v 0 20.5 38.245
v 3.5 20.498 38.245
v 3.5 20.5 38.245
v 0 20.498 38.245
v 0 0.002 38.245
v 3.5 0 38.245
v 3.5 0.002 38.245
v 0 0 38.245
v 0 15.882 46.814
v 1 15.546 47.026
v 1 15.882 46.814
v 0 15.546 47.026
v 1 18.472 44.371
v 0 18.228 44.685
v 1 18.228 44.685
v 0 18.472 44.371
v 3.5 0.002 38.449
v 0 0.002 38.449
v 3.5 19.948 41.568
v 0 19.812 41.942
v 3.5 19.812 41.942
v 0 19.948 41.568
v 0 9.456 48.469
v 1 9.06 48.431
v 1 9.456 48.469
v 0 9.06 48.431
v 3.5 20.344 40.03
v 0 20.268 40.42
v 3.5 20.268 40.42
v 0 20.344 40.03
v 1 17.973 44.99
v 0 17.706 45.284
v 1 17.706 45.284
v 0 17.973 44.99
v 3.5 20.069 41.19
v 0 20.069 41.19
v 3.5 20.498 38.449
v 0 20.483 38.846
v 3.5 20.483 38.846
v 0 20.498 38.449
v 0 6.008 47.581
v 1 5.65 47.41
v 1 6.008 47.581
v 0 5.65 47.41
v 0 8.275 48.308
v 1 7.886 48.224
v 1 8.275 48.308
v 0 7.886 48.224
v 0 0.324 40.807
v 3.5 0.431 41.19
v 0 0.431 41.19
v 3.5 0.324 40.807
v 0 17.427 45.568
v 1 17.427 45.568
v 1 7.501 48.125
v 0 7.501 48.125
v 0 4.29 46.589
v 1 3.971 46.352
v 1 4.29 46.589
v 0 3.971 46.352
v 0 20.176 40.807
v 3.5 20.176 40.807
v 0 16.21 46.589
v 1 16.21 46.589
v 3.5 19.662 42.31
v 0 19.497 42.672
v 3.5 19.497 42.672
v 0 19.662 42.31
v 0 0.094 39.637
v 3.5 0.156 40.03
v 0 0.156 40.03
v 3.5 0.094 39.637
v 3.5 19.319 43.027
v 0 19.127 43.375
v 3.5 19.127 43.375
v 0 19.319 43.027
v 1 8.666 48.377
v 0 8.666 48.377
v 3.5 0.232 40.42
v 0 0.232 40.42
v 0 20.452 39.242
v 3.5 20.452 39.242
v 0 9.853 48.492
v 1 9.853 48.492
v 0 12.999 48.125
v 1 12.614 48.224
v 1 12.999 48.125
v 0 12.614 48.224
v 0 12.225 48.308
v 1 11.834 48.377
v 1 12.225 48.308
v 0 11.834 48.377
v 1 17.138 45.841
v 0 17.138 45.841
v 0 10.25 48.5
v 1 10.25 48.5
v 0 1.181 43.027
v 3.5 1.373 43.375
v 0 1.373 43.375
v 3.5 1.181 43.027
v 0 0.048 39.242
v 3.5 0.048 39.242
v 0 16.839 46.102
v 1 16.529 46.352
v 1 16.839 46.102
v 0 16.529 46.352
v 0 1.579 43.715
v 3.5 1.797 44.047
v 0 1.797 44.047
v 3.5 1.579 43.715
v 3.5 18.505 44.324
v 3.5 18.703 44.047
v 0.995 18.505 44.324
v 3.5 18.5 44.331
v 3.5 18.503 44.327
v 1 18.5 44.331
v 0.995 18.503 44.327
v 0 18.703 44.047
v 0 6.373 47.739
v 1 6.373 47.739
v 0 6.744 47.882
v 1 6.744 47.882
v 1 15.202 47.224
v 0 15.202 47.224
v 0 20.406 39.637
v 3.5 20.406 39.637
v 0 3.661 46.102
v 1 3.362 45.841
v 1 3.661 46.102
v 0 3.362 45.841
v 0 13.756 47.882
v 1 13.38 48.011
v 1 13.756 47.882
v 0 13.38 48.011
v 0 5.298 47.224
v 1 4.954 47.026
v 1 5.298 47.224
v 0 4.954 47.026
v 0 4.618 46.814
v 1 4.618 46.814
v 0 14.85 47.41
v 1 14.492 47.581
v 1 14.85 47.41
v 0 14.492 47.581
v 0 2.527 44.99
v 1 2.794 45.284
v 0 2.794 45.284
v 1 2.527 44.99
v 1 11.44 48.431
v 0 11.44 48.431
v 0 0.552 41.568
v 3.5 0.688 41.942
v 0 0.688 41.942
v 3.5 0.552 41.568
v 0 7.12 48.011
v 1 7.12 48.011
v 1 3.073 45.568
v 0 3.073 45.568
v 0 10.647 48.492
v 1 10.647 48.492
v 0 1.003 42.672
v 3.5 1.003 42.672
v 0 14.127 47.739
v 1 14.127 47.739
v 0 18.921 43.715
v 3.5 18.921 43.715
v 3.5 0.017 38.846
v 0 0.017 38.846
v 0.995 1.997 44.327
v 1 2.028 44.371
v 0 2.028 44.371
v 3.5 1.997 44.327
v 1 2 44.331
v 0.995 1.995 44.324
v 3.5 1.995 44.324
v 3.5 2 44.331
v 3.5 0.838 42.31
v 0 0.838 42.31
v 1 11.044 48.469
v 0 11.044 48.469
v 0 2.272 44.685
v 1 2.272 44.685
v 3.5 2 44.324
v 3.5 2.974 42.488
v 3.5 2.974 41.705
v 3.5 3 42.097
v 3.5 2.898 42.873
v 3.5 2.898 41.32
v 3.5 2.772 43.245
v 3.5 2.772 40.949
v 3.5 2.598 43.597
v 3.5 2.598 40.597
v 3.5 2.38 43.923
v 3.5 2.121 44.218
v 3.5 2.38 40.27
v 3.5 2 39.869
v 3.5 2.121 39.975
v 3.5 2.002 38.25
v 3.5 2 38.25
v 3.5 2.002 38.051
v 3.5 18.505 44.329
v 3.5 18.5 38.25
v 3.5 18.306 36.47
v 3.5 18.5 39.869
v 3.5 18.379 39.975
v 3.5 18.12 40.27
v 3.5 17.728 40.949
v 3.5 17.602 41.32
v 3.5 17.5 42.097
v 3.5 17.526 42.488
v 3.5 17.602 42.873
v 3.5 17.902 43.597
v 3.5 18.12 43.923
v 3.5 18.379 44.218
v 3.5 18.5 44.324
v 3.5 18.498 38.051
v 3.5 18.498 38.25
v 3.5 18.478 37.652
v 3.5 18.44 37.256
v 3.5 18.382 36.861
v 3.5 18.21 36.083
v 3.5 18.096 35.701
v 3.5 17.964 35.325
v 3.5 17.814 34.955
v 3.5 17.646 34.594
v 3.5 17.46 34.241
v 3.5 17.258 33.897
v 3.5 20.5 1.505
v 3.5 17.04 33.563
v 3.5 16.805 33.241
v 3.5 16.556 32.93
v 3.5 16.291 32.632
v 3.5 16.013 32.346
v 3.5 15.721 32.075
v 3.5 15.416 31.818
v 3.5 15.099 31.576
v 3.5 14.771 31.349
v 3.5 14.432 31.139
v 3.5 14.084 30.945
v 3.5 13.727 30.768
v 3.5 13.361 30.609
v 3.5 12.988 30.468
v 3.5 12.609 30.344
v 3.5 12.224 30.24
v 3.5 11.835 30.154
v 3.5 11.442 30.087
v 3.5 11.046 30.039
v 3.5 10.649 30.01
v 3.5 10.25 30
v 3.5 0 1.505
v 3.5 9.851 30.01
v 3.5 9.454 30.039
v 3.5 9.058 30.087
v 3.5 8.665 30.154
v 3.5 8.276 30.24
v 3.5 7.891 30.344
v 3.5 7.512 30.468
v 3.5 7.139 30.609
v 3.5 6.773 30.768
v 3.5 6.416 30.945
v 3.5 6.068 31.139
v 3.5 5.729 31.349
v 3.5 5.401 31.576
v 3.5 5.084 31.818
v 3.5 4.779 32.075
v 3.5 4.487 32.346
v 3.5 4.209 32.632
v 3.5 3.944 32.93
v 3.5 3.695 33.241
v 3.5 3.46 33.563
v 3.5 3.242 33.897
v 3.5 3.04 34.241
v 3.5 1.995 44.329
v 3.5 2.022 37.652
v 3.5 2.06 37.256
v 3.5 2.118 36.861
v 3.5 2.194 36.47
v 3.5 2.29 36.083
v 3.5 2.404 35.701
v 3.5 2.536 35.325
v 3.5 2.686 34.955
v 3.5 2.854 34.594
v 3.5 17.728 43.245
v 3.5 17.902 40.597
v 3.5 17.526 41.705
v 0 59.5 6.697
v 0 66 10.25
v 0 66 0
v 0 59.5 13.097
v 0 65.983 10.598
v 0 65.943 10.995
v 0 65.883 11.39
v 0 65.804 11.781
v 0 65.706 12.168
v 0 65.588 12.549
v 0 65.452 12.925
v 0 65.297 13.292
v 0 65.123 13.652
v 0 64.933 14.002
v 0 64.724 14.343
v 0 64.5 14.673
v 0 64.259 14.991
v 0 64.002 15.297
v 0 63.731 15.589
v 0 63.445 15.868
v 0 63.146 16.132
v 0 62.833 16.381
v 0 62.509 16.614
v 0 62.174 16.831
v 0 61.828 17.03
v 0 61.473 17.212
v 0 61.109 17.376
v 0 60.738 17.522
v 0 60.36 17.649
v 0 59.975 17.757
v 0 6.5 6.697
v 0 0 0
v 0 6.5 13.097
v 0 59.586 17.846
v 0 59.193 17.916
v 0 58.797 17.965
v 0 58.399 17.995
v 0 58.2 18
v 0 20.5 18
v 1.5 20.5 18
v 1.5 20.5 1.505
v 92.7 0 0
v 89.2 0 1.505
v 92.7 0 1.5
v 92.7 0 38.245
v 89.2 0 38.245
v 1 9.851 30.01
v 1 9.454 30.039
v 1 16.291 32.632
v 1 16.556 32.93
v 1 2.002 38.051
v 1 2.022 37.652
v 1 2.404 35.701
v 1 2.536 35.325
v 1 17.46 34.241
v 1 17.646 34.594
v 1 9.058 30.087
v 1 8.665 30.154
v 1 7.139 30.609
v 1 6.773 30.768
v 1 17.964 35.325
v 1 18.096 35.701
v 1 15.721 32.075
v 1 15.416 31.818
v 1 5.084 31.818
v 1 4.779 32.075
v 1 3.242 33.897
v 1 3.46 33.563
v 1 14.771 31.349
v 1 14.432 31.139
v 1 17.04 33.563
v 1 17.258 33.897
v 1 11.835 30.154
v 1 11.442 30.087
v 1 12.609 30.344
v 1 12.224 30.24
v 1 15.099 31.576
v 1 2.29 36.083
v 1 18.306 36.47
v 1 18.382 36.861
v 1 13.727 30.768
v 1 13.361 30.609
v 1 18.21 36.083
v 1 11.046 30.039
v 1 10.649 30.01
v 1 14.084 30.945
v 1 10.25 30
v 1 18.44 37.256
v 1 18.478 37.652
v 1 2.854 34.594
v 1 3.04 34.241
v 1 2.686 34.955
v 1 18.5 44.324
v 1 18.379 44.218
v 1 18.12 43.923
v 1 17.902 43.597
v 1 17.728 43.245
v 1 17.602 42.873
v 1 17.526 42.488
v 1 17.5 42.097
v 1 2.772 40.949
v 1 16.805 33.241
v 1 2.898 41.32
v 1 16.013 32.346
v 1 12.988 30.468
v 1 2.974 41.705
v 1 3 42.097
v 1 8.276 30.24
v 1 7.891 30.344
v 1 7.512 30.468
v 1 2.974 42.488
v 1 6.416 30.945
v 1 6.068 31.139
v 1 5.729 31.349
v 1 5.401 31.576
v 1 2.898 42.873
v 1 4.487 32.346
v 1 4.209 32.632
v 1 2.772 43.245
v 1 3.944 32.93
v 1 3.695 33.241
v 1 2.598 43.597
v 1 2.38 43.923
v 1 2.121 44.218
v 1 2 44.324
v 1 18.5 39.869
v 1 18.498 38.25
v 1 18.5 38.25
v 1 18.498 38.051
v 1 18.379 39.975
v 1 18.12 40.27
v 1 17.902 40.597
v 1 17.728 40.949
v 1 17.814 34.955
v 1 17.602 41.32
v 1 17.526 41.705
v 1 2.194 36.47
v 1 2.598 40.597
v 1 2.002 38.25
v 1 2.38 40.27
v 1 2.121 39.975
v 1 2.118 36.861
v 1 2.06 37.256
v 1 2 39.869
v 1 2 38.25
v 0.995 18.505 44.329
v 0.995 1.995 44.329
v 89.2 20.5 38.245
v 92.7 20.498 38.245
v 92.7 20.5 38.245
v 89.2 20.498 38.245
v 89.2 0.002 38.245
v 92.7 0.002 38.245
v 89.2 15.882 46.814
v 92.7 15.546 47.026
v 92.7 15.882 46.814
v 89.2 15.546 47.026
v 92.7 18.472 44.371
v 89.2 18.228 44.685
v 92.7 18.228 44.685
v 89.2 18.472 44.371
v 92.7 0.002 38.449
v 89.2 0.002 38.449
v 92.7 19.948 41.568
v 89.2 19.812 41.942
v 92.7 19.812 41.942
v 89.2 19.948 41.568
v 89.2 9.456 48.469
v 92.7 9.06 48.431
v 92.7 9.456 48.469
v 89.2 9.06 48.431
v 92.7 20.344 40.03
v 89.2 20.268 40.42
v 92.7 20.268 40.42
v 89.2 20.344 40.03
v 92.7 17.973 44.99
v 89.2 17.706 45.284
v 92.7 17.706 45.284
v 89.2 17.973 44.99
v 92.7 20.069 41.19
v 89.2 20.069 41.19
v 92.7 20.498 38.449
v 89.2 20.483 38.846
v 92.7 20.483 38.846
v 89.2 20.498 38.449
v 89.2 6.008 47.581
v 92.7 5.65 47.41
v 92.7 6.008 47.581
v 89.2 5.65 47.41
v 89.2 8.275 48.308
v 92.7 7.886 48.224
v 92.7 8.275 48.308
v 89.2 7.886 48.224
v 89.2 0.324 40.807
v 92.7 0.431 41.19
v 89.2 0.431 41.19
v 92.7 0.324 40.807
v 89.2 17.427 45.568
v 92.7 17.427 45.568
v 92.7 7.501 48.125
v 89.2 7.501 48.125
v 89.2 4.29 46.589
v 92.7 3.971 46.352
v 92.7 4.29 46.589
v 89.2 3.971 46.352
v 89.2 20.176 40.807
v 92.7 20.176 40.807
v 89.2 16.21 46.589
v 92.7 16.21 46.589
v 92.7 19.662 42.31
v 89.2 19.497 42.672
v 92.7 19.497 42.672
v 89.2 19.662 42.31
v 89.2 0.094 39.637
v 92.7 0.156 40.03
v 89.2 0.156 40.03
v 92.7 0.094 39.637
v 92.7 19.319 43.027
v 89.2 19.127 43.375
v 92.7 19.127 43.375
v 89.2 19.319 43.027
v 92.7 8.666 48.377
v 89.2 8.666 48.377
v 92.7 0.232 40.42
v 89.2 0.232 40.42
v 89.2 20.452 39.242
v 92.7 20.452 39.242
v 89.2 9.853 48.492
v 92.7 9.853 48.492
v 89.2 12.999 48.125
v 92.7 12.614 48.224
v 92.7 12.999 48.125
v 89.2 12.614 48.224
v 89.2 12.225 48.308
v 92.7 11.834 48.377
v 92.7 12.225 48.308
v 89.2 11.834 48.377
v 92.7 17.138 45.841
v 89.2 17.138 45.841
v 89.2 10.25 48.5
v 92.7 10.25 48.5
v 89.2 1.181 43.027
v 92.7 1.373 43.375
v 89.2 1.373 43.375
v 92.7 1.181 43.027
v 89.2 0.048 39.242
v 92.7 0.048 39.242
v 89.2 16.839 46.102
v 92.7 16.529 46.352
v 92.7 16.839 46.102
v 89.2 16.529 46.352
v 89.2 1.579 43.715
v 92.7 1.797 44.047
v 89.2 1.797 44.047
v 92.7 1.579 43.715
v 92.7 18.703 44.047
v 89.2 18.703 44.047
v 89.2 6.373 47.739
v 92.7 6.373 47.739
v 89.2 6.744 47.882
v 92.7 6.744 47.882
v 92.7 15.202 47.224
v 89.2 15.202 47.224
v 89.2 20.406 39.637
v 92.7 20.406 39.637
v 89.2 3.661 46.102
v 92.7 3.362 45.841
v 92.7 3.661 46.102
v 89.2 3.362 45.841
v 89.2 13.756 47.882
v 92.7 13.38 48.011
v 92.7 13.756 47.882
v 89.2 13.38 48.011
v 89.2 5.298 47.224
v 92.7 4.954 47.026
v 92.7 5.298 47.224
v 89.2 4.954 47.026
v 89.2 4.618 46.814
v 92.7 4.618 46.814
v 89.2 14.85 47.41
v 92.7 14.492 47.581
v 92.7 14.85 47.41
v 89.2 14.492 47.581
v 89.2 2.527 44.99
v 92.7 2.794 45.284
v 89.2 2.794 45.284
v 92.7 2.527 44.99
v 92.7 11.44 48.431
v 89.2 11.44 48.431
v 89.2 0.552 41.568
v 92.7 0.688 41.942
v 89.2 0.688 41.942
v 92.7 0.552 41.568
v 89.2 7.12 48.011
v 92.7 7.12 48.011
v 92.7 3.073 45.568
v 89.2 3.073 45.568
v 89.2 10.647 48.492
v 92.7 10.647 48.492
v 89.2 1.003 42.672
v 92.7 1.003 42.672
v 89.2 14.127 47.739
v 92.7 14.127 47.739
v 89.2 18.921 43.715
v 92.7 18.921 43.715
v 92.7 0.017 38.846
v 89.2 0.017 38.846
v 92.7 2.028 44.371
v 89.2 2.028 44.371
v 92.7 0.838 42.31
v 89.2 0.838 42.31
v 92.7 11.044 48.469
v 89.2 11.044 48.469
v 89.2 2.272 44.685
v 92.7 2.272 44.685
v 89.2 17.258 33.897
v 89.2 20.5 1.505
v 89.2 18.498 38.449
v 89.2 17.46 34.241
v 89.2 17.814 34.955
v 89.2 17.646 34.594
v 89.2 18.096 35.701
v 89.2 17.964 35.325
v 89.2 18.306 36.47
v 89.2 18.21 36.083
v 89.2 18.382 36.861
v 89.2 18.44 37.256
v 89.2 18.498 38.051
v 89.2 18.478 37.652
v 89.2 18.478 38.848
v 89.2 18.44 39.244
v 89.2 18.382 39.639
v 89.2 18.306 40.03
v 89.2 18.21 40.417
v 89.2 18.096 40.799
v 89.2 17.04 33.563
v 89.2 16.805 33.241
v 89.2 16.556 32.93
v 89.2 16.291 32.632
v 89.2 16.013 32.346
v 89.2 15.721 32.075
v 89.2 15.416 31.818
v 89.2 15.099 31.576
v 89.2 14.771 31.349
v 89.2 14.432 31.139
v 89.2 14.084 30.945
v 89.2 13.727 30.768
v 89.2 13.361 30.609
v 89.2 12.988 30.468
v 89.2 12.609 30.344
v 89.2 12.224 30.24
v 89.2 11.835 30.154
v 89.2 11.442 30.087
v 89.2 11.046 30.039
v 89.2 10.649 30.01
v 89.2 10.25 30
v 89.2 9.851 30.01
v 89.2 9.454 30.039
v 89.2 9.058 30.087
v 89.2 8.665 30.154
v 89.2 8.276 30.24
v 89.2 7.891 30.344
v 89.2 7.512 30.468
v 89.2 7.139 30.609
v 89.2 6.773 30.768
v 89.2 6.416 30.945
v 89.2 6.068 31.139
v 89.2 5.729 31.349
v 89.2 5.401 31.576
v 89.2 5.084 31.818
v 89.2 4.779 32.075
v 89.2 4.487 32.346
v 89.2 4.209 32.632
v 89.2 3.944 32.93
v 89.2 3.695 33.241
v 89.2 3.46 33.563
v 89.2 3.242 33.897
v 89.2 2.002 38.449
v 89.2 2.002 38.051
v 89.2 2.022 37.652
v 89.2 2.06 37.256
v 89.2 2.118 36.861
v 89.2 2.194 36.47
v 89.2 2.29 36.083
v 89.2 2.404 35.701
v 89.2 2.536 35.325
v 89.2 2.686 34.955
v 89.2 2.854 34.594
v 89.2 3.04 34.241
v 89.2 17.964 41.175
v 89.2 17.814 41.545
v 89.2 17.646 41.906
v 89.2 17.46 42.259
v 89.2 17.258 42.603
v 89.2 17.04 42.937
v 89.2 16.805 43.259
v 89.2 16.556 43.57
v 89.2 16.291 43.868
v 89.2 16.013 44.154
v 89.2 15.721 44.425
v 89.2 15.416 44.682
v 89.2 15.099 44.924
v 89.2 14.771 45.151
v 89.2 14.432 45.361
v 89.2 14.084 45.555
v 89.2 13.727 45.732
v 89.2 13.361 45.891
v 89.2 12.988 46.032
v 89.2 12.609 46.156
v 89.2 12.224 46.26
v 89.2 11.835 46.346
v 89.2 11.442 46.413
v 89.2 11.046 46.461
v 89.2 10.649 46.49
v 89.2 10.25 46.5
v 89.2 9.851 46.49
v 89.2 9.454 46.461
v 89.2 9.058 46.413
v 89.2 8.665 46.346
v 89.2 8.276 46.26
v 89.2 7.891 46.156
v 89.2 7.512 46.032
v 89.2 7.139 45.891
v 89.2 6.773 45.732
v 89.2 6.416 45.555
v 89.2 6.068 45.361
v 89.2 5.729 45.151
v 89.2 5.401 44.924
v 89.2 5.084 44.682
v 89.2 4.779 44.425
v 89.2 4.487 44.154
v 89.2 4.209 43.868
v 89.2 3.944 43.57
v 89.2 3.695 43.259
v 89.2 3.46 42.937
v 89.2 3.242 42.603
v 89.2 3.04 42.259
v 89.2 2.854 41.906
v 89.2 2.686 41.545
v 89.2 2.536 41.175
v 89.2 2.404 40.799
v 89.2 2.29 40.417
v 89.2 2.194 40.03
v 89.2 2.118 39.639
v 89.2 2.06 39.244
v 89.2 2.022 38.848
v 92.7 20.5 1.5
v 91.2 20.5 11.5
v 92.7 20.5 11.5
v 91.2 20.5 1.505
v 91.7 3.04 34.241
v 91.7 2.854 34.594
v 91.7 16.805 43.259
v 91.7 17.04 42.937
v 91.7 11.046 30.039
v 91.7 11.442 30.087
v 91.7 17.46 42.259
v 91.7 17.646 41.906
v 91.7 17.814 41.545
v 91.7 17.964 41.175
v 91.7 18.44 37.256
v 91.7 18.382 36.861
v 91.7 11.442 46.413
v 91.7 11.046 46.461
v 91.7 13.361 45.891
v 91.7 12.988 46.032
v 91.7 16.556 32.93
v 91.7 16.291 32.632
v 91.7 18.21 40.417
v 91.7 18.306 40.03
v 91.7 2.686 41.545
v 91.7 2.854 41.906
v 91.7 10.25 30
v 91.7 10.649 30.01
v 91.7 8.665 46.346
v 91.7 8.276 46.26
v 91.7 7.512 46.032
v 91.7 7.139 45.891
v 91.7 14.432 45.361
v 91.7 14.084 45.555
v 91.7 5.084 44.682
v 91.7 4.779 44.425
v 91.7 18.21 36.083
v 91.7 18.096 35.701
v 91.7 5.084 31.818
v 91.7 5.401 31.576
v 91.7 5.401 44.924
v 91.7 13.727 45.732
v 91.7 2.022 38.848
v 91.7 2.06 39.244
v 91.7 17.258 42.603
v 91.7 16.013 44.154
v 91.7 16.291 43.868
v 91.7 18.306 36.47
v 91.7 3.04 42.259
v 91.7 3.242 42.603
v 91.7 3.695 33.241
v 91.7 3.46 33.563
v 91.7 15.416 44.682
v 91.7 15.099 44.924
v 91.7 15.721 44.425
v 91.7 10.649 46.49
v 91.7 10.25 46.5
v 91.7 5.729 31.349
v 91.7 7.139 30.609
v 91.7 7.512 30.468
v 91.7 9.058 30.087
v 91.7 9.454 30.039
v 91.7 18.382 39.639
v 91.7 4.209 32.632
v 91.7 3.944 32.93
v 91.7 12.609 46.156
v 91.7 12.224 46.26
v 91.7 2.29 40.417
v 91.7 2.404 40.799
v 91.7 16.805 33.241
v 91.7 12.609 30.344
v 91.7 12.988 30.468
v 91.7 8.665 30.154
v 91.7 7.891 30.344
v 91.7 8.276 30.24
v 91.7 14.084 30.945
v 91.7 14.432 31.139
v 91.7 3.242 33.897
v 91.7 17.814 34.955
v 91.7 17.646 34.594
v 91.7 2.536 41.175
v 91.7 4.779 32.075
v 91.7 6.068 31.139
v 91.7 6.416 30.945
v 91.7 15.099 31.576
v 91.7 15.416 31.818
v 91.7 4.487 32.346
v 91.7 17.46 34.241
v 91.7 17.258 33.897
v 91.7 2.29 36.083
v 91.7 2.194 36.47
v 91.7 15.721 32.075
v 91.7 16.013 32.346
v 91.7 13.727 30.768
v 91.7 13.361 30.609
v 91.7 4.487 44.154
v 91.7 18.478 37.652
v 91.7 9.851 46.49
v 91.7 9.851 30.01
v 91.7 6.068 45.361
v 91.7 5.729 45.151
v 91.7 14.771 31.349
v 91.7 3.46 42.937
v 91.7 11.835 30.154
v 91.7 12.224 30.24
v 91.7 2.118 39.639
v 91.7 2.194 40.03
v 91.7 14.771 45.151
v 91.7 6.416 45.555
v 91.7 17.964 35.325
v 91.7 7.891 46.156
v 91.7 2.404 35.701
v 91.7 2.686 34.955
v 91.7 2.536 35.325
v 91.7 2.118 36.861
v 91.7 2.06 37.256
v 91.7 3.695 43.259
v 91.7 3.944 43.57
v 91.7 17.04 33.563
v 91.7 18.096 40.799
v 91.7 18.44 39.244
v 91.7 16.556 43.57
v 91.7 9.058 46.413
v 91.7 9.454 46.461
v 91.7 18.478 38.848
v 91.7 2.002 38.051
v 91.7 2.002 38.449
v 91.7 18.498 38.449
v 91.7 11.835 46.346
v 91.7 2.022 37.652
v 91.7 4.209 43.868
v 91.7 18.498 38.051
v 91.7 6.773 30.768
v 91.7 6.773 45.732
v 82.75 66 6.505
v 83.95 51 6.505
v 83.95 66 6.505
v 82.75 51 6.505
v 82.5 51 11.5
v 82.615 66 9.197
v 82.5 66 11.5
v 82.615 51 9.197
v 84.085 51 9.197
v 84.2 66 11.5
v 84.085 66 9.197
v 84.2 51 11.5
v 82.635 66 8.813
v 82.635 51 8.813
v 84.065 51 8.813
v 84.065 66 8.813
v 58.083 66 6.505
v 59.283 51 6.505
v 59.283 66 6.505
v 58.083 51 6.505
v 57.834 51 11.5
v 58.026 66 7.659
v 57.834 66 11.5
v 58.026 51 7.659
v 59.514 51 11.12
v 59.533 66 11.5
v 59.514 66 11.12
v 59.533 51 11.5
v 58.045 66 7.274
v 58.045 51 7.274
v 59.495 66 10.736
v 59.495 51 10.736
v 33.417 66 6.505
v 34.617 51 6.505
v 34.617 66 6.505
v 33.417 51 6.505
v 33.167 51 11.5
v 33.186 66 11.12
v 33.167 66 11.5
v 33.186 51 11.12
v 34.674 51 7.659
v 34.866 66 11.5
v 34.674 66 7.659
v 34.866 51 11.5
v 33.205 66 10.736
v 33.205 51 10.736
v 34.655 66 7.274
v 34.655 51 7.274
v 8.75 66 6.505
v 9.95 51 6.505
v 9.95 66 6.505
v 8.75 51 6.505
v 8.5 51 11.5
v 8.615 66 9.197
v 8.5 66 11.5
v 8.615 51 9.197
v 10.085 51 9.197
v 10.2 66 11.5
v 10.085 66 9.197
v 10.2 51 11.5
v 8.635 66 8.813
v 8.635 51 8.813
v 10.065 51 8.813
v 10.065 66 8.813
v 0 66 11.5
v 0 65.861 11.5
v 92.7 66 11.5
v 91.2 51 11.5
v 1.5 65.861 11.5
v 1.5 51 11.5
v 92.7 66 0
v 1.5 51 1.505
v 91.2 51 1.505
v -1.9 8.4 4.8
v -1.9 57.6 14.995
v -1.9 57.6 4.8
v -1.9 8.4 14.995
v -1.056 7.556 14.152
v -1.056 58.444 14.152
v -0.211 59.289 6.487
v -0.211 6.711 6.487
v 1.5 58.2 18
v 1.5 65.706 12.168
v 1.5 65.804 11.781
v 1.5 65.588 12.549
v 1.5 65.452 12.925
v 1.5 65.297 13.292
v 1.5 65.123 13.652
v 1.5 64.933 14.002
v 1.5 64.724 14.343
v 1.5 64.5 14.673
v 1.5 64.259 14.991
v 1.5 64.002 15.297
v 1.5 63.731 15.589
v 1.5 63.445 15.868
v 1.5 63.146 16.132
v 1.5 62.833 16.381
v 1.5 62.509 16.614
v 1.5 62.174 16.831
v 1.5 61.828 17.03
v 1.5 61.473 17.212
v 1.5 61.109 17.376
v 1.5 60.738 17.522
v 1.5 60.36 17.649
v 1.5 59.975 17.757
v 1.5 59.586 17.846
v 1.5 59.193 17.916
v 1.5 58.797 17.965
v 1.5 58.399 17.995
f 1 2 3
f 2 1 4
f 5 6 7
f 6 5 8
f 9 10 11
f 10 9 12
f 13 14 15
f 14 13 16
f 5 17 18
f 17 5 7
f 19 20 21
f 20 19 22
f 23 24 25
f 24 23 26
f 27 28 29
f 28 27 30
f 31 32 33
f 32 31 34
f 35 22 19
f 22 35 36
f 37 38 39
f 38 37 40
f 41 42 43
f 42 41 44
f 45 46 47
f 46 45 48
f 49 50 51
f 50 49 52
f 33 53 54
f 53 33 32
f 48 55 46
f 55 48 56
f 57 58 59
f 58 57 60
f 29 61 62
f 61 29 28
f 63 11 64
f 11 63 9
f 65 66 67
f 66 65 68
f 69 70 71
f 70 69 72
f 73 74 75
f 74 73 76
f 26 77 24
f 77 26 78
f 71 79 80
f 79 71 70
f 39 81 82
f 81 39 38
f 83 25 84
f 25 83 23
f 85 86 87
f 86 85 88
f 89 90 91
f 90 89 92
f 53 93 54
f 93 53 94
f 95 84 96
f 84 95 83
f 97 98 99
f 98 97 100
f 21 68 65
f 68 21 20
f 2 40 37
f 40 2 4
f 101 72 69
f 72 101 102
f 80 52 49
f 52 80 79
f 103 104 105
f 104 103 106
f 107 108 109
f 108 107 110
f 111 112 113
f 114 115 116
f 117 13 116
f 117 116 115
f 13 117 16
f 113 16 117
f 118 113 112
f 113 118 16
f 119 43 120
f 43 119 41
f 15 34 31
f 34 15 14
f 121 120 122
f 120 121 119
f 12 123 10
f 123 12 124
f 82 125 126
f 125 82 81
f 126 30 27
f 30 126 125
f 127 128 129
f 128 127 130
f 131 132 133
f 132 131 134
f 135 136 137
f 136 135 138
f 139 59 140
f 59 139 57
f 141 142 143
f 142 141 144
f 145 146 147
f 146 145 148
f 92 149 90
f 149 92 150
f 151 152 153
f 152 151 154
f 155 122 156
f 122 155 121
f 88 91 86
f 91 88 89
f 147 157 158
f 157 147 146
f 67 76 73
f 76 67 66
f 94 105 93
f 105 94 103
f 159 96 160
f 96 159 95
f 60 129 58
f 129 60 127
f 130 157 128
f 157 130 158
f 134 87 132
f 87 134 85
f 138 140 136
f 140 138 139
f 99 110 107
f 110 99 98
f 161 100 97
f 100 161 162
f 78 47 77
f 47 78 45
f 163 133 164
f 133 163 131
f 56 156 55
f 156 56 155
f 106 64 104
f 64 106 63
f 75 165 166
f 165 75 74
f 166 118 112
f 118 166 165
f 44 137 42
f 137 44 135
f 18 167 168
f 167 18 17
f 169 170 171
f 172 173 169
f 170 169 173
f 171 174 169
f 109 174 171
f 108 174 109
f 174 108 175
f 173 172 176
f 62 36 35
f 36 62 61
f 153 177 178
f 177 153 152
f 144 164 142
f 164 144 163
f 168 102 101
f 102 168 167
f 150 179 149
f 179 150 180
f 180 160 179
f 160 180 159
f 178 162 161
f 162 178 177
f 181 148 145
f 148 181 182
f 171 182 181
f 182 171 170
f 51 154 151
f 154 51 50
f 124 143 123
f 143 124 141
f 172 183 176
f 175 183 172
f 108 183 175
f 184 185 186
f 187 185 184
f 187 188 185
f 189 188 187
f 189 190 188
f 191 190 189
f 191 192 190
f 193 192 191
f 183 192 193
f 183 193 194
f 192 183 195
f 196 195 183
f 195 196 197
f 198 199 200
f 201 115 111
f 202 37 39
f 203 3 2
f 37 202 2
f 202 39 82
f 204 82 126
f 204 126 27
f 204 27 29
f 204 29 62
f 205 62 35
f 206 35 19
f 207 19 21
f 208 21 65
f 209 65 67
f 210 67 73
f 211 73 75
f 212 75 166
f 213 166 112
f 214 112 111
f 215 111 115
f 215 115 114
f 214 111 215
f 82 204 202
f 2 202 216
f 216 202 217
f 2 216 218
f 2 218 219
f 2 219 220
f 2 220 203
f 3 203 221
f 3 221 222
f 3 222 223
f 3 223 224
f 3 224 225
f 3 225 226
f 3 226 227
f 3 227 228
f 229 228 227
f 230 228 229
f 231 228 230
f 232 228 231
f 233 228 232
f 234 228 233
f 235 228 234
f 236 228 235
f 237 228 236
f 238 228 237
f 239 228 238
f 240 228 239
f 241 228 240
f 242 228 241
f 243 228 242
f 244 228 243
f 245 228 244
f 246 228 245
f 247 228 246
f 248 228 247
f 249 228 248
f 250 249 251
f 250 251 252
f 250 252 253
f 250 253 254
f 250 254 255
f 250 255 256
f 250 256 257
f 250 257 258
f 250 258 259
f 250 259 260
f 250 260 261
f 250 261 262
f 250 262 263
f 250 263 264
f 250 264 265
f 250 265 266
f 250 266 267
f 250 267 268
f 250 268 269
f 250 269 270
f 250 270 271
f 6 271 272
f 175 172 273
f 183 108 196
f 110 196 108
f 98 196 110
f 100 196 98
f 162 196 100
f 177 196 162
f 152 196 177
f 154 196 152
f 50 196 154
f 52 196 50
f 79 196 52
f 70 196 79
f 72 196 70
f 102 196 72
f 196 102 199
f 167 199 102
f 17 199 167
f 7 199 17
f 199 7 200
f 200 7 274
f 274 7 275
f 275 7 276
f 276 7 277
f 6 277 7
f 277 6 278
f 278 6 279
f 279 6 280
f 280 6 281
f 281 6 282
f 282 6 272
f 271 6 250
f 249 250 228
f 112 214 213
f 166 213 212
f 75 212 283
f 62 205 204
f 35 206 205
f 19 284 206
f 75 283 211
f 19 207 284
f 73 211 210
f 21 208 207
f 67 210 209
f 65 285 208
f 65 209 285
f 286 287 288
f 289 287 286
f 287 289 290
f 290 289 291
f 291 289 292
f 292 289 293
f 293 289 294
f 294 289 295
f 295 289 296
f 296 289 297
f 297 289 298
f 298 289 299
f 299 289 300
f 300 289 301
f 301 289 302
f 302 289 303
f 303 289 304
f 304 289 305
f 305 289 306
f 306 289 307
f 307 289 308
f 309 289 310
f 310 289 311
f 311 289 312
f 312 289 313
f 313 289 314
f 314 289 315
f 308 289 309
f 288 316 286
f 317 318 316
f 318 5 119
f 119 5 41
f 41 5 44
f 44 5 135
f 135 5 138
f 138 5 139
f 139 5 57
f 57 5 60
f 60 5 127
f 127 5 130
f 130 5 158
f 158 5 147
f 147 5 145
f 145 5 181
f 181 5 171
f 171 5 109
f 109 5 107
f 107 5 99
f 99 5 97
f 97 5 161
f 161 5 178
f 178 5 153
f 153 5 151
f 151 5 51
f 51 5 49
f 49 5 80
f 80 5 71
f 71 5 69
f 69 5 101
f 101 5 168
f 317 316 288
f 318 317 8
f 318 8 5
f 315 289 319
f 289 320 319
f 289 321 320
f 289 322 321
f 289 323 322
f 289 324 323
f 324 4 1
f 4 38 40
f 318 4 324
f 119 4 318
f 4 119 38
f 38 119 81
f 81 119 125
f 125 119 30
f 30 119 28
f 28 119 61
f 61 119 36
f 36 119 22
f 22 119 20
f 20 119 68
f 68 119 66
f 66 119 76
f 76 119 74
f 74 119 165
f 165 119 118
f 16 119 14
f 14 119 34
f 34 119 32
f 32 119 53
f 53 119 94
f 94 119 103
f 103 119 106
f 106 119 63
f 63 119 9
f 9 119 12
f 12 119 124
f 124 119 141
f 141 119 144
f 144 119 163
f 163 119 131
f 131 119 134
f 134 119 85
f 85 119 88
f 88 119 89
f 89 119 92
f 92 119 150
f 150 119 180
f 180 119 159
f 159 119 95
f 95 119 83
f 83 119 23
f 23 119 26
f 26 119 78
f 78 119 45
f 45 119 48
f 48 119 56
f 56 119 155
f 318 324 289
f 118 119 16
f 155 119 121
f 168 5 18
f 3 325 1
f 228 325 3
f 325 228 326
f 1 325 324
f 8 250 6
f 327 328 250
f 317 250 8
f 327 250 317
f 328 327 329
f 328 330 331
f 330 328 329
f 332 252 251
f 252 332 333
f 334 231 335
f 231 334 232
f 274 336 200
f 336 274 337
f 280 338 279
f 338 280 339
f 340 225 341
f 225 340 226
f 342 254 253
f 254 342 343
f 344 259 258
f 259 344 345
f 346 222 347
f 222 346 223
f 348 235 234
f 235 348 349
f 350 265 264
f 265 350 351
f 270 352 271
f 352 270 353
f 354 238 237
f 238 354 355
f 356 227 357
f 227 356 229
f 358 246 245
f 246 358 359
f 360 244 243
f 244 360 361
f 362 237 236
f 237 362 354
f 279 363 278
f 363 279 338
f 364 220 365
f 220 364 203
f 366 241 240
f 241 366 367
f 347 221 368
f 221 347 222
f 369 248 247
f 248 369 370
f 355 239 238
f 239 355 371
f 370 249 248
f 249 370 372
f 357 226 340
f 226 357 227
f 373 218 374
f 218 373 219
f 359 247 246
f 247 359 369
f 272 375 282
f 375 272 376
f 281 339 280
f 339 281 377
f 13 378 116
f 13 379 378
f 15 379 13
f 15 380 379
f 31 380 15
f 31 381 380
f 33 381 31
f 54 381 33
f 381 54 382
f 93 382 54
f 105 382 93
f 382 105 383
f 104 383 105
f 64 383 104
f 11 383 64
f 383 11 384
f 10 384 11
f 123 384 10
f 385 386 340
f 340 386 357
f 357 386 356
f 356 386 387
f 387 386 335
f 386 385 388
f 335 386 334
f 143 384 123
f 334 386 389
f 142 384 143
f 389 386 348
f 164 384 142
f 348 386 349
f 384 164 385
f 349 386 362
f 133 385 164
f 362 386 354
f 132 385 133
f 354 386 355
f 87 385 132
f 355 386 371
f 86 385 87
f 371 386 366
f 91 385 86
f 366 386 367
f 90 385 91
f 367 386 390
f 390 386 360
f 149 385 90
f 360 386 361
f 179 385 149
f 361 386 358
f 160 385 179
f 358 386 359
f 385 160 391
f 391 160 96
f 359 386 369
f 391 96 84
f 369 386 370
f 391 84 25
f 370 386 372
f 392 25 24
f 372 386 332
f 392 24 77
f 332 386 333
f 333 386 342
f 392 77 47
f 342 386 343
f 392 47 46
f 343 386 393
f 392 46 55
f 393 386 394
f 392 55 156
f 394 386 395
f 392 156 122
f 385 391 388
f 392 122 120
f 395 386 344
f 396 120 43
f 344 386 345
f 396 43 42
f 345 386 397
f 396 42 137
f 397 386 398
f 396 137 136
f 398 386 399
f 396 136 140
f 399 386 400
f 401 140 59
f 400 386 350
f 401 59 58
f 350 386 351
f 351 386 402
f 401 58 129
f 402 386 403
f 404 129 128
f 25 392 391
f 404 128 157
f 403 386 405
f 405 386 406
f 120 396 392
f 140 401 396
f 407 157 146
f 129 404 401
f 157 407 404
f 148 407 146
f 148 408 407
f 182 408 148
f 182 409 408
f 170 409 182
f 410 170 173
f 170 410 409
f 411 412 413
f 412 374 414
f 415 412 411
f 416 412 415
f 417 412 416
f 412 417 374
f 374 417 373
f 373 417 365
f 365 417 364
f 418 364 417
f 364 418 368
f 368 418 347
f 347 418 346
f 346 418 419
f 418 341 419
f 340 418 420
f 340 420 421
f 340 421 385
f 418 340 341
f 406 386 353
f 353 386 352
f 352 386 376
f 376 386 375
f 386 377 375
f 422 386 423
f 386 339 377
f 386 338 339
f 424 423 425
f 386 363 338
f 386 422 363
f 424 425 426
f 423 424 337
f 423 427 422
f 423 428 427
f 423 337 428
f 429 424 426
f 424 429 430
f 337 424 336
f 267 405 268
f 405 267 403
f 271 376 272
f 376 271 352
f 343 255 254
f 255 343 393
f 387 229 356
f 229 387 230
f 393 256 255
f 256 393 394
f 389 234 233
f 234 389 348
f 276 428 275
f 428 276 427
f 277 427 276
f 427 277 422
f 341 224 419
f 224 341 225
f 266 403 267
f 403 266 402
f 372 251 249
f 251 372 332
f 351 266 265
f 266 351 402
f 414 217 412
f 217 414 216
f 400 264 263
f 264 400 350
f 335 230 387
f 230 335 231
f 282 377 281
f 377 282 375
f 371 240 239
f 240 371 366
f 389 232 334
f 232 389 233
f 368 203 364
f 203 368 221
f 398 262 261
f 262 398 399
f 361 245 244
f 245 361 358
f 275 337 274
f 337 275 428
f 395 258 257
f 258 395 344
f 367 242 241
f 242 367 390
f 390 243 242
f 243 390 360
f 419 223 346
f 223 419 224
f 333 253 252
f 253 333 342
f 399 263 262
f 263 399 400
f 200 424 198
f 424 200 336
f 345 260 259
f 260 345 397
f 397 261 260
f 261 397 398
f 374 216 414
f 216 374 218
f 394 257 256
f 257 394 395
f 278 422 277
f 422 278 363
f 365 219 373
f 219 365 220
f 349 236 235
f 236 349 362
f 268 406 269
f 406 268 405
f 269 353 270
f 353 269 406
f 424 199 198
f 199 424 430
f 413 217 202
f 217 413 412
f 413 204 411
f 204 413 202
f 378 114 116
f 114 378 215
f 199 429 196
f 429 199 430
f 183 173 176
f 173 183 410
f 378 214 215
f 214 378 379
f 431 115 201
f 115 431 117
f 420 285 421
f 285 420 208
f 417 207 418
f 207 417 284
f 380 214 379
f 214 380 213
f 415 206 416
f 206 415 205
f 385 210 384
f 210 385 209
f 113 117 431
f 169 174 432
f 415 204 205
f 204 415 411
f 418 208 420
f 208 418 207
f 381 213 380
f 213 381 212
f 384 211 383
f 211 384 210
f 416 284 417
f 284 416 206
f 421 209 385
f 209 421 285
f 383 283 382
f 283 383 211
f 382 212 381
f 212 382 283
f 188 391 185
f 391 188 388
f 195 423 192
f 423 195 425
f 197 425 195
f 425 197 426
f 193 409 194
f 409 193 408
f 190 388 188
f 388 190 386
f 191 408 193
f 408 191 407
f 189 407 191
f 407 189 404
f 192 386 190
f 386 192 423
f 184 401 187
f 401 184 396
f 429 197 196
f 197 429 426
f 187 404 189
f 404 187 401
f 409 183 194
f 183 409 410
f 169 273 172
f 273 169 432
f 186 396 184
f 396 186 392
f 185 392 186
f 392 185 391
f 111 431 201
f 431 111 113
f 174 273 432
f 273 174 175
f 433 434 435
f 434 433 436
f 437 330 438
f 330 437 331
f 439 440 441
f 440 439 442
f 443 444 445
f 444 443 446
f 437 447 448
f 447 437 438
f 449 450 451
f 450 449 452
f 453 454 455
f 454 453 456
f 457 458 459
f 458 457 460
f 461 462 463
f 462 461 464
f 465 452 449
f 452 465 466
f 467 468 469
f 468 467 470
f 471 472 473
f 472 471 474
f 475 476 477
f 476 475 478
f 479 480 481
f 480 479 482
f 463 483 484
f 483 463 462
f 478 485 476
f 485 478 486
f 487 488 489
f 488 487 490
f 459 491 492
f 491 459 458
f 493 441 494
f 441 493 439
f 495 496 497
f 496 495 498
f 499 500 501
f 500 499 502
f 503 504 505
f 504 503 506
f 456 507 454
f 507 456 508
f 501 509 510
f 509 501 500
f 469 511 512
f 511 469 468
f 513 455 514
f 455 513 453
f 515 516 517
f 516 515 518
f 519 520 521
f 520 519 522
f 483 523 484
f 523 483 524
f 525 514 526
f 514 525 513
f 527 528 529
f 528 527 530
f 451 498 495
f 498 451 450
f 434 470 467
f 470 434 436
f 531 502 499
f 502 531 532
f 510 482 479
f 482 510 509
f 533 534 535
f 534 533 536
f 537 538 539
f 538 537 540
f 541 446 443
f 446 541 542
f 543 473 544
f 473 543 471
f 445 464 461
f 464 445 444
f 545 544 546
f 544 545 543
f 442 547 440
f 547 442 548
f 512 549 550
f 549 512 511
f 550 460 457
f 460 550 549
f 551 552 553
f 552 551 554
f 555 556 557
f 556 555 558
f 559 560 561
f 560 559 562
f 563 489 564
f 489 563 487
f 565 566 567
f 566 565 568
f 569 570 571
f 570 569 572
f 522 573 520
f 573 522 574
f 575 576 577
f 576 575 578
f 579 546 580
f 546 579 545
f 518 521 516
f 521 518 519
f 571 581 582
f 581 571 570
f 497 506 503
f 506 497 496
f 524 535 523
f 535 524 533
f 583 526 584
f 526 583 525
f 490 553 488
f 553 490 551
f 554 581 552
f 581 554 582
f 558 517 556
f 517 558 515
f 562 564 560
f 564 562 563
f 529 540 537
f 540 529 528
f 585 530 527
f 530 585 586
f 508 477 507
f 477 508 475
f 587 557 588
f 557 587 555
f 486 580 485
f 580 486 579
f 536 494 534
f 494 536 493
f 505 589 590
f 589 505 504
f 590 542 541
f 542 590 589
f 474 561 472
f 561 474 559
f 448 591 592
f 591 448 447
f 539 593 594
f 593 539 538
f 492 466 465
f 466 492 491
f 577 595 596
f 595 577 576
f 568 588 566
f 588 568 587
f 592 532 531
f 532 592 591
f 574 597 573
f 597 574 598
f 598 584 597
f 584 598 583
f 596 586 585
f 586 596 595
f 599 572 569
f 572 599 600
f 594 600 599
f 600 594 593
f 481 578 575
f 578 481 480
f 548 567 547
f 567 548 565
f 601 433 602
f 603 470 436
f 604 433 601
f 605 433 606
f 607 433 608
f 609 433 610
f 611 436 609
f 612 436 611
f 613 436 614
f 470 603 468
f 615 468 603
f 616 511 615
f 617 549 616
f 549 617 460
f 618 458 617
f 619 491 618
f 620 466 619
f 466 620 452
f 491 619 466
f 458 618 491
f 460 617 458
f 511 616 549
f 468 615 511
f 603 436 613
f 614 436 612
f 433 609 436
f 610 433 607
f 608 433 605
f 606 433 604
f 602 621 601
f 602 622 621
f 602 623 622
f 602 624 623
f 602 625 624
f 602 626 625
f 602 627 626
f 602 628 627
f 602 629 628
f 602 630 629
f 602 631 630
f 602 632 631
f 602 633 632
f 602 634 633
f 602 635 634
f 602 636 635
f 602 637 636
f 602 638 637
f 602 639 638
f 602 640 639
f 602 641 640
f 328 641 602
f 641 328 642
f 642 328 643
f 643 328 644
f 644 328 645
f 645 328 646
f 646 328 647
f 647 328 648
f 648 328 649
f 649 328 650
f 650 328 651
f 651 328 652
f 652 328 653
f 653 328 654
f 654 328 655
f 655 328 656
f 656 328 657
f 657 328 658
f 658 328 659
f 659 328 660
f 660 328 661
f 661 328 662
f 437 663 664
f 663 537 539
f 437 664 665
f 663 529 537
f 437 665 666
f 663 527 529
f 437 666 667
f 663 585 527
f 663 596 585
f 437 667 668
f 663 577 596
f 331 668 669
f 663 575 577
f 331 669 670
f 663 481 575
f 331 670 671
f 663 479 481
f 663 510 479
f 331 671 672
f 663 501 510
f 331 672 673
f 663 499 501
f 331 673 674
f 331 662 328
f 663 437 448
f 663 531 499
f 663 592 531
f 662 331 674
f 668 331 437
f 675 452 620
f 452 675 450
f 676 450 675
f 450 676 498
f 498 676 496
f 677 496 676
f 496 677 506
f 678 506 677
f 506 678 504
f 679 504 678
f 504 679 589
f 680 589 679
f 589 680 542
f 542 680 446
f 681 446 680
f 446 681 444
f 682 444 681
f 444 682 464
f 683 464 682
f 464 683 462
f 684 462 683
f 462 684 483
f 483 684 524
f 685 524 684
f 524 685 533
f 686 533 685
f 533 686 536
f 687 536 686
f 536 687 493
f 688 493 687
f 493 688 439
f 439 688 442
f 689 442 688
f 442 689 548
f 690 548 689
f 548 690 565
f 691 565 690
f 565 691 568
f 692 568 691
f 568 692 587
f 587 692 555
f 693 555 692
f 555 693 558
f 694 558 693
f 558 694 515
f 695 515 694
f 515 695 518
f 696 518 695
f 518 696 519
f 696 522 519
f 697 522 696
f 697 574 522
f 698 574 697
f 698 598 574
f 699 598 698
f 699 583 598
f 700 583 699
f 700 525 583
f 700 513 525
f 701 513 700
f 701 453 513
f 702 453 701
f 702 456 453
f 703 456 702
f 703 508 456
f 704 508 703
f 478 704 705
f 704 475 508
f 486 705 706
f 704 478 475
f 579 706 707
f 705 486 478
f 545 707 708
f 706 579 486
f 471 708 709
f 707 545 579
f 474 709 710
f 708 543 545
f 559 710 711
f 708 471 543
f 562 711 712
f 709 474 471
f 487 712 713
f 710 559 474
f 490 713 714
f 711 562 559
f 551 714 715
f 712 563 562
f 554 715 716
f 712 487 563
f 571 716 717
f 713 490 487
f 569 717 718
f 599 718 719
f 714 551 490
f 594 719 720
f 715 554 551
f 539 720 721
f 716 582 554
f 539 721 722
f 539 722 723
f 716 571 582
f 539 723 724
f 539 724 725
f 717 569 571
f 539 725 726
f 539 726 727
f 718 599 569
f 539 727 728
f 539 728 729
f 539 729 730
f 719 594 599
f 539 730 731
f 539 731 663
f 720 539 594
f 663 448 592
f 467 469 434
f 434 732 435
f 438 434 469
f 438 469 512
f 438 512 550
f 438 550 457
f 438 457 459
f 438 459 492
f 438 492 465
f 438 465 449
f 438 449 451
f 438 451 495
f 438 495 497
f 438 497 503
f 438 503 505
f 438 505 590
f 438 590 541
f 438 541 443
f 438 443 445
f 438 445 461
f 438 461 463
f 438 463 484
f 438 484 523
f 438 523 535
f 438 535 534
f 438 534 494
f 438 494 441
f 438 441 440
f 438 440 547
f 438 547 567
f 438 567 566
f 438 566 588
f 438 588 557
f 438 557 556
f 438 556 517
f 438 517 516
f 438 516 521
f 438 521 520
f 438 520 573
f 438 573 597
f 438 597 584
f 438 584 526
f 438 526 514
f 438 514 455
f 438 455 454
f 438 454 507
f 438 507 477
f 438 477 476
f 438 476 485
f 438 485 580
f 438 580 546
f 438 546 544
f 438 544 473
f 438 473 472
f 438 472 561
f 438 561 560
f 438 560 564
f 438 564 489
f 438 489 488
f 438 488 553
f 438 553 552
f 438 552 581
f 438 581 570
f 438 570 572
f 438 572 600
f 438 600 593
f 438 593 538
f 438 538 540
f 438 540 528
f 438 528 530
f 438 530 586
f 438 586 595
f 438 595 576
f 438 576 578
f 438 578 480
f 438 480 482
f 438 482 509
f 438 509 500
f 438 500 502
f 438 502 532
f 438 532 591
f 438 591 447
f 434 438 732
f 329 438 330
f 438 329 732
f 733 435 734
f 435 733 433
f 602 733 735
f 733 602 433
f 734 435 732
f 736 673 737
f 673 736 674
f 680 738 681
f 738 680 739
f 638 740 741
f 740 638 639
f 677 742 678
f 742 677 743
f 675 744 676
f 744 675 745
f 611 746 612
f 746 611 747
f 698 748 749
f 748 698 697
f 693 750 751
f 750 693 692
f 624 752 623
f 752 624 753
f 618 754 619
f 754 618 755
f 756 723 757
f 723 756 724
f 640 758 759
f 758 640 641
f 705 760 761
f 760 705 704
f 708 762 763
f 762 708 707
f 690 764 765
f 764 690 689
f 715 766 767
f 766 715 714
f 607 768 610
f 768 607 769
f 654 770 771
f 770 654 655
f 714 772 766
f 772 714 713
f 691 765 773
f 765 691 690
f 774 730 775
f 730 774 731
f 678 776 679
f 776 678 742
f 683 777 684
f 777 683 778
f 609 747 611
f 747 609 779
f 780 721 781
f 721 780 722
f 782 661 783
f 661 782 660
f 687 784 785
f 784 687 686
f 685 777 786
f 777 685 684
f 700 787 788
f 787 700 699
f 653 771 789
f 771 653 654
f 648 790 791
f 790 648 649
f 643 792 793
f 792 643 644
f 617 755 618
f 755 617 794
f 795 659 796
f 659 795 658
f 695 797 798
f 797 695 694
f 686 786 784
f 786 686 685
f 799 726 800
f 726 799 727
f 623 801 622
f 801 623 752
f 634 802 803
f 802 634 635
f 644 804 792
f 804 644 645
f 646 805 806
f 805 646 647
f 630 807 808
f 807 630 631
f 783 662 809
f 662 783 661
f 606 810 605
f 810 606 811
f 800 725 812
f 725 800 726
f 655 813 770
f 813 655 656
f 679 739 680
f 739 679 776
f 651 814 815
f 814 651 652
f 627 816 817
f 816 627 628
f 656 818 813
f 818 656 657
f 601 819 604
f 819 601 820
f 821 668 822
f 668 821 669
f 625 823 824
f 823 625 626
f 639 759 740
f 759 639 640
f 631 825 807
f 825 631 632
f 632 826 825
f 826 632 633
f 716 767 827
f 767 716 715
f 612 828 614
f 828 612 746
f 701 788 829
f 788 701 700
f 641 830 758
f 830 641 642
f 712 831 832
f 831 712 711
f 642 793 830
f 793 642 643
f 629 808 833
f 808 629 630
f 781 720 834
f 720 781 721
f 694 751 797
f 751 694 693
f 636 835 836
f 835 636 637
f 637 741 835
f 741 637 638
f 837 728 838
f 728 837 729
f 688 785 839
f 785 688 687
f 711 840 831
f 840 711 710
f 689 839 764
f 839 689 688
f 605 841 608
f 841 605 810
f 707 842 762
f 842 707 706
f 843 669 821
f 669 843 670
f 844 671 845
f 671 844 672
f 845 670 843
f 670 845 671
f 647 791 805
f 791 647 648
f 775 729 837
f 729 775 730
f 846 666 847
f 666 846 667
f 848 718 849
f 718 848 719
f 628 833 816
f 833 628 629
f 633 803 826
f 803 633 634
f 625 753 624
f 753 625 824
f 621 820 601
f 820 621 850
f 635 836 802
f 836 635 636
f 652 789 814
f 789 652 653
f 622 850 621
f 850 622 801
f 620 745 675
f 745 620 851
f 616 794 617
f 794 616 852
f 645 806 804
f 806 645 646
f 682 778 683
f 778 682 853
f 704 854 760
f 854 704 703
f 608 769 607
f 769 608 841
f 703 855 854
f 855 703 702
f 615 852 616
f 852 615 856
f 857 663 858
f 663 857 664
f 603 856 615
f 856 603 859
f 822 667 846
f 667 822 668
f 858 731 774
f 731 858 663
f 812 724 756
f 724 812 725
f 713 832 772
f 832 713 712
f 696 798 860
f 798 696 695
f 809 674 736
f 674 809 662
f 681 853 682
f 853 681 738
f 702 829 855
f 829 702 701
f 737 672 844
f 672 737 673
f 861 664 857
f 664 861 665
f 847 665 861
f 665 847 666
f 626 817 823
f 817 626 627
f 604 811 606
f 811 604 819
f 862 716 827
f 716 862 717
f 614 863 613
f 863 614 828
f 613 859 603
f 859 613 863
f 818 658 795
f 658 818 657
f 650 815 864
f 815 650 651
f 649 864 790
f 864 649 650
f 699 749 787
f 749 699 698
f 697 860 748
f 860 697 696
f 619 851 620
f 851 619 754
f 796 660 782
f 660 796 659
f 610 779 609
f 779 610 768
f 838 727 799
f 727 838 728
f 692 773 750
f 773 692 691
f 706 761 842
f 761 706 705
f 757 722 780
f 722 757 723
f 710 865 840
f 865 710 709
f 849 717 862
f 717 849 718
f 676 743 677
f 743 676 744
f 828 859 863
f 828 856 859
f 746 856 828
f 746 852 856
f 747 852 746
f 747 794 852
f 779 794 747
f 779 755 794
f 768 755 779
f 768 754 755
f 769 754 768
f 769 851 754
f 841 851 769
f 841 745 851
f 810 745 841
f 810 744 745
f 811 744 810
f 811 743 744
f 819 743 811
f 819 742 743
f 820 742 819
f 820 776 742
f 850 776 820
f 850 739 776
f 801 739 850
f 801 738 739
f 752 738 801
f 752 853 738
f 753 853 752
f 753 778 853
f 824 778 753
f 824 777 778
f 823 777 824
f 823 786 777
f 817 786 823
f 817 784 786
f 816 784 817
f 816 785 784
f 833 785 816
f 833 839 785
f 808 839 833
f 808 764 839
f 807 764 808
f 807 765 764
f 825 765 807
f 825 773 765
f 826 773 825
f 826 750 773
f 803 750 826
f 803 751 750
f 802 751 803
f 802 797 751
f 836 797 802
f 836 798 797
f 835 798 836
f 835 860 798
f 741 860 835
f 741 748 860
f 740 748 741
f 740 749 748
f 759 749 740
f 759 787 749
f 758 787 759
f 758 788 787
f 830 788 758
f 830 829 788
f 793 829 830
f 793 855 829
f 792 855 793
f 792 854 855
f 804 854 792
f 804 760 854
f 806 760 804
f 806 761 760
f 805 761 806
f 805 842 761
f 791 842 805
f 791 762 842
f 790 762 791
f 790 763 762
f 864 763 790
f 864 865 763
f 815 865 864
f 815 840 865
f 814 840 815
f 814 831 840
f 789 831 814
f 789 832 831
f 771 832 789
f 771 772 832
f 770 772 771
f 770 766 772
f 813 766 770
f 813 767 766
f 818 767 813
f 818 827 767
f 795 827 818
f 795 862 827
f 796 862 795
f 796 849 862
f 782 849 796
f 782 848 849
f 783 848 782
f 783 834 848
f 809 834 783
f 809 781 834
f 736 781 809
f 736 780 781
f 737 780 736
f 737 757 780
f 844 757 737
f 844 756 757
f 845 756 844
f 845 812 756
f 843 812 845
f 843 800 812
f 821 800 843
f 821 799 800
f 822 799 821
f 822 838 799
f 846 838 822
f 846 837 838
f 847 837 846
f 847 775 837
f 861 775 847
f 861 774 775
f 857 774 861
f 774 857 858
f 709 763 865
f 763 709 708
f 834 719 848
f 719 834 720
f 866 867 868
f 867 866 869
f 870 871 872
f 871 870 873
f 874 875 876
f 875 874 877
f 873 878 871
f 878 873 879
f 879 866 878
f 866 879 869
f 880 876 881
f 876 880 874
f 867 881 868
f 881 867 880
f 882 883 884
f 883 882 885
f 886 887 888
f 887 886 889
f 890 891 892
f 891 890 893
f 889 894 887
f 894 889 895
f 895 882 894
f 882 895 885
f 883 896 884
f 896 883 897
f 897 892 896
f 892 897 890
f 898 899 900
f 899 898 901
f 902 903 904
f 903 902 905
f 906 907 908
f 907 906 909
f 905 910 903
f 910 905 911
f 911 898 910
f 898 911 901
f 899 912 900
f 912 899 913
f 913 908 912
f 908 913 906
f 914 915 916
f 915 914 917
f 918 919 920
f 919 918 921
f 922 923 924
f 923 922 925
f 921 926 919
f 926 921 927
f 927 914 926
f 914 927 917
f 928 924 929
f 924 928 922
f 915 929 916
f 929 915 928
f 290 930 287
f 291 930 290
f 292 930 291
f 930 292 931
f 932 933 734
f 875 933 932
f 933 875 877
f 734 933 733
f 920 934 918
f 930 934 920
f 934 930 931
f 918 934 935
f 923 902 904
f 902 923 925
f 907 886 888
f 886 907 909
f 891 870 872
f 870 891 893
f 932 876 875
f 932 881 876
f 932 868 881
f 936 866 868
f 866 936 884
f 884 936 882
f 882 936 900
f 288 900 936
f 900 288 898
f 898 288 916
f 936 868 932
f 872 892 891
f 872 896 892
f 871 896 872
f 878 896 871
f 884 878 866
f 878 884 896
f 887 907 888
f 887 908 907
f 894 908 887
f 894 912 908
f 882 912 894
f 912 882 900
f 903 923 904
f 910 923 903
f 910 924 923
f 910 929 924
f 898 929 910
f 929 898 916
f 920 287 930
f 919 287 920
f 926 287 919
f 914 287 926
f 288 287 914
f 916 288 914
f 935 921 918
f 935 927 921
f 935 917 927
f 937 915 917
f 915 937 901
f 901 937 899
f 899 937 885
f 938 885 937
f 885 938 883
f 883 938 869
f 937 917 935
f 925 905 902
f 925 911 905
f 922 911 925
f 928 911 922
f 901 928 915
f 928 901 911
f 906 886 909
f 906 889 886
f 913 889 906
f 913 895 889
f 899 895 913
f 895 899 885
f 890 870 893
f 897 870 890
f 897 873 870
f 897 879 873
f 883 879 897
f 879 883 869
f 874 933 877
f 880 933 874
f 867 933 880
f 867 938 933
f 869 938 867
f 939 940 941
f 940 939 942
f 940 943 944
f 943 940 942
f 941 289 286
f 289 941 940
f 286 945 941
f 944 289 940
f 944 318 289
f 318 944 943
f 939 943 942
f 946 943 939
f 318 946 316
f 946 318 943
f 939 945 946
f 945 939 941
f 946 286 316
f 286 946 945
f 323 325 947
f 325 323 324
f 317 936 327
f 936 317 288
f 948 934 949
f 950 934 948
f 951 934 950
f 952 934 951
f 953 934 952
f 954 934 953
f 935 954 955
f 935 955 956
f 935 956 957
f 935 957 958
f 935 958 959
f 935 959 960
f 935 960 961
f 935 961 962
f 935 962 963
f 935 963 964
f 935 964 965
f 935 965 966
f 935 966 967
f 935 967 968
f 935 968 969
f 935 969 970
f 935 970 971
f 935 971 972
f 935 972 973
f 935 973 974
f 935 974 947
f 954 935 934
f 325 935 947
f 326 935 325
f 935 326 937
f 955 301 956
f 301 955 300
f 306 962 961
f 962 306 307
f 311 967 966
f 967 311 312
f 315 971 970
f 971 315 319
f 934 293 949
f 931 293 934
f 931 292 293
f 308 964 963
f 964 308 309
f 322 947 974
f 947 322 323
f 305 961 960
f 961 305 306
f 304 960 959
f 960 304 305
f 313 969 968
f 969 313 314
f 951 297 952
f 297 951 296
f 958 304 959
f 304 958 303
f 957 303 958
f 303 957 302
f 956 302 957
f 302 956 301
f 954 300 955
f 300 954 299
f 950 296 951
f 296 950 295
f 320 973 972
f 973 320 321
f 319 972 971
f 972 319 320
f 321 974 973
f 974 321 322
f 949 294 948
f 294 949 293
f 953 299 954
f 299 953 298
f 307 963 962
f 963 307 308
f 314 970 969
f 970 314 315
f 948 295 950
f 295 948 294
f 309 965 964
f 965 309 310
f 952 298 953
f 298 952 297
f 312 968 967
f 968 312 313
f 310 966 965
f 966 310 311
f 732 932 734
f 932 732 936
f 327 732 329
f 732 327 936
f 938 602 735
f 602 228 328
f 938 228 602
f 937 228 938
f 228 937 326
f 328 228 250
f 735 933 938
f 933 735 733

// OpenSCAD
$fa=1;
$fs=0.4;
overlap=0.005;

// todo: round base corners.

// Main customisation
wire_diameter=1.5;
reel_outer_diameter=55;
reel_inner_diameter=25;
rod_diameter=16.5;
rod_length=90.7;
wire_holder_length=15;
wire_holder_count=4;
base_length=66;

// Other parameters
base_thickness=1.5;
reel_bottom_spacing=5;
rod_depth=2.5;
rod_margin=2;
rod_holder_thickness=rod_depth+1;
rod_holder_bump_radius=3;
rod_holder_bump_size=1;
wire_holder_reel_distance=5; // Horizontal distance from reel to wire holder
wire_holder_margin=5; // Distance between the end and the outer slots
wire_holder_height=10;
joiner_height=18;

// Calculation
rod_centre_height=reel_outer_diameter/2+reel_inner_diameter/2-rod_diameter/2+reel_bottom_spacing;
// wire_holder_y=rod_diameter/2+rod_margin+reel_outer_diameter/2+wire_holder_reel_distance;
base_width=2*rod_holder_thickness-2*rod_depth+rod_length;
// base_length=wire_holder_y+wire_holder_length;
wire_holder_y=base_length-wire_holder_length;
joiner_corner_radius=joiner_height-wire_holder_height+overlap;

module rod_holder(open=false) {
    width=rod_diameter+rod_margin*2;
    height=rod_centre_height+rod_diameter/2+rod_margin;
    holder_inset_thickness=rod_holder_thickness-rod_depth;

    difference() {
        cube([rod_holder_thickness, width, height]);
        translate([holder_inset_thickness, width/2, rod_centre_height])
            rotate([0, 90, 0])
            cylinder(r=rod_diameter/2, h=rod_depth+overlap);
        difference() {
            translate([-overlap, -overlap, height-width/2-overlap])
                cube([rod_holder_thickness+overlap*2, width+overlap*2, width/2+overlap*2]);
            translate([-overlap, width/2, rod_centre_height])
                rotate([0, 90, 0])
                cylinder(r=width/2, h=rod_holder_thickness+overlap*2);
        }
        if (open) {
            // Cut top of circle out
            translate([holder_inset_thickness, rod_margin, rod_centre_height])
                cube([rod_depth+overlap, rod_diameter, rod_diameter/2+rod_margin+overlap]);
        }
    }
    if (open) {
        intersection() {
            for (bump_side=[-1:2:1]) {
                translate([
                    holder_inset_thickness-overlap,
                    rod_margin+(bump_side<0 ? rod_diameter:0)+bump_side*(rod_holder_bump_size-rod_holder_bump_radius),
                    rod_centre_height+sqrt((rod_diameter/2+rod_margin)^2-(rod_diameter/2)^2)-sqrt(rod_holder_bump_radius^2-(rod_holder_bump_radius-rod_holder_bump_size)^2)
                ])
                    rotate([0, 90, 0])
                    cylinder(r=rod_holder_bump_radius, h=rod_depth+overlap);
            }
            translate([holder_inset_thickness-overlap, rod_margin-overlap, rod_centre_height])
                cube([rod_depth+overlap, rod_diameter+overlap*2, rod_diameter/2+rod_margin+overlap]);
        }
    }
}

module wire_holder(
    length=wire_holder_length,
    wire_hole_depth=5,
    wire_diameter_min=wire_diameter-0.3,
    wire_diameter_max=wire_diameter+0.2
) {
    slots_length=base_width-wire_diameter_max-wire_holder_margin*2-rod_holder_thickness*2;
    translate([base_width/2, length/2, 0])
        difference() {
            linear_extrude(height=wire_holder_height)
                square([base_width, length], center=true);
            for (slot=[0:1:wire_holder_count-1]) {
                translate([slots_length/2 - slot*slots_length/(wire_holder_count-1), 0, wire_holder_height+overlap-wire_hole_depth])
                    linear_extrude(height=wire_hole_depth, scale=[wire_diameter_max/wire_diameter_min, 1])
                    square([wire_diameter_min, length+overlap], center=true);
            }
        }
}

module joiner(
    length,
    height,
    thickness
) {
    inner_wedge_outer_bottom_z=4.8;
    inner_wedge_outer_height=10.195;
    inner_wedge_inner_height=6.4;
    inner_wedge_depth=1.9;
    inner_wedge_inner_length=53.0;
    inner_wedge_outer_length=inner_wedge_inner_length-inner_wedge_depth*2;

    translate([0, length/2, inner_wedge_outer_height/2+inner_wedge_outer_bottom_z])
        rotate([0, 90, 0])
        linear_extrude(height=inner_wedge_depth, scale=[inner_wedge_outer_height/inner_wedge_inner_height, inner_wedge_outer_length/inner_wedge_inner_length])
        square([inner_wedge_inner_height, inner_wedge_inner_length], center=true);
    translate([-thickness, 0, 0])
        cube([thickness, length, height]);
}

translate([0, 0, base_thickness])
    rod_holder(open=true);
translate([base_width, 0, base_thickness])
    mirror([1, 0, 0])
    rod_holder(open=false);

translate([0, wire_holder_y, base_thickness])
    wire_holder();

// Base
cube([base_width, base_length, base_thickness+overlap]);

// Joiner
difference() {
    mirror([1, 0, 0])
        joiner(length=base_length, height=joiner_height, thickness=base_thickness);
    translate([-overlap, base_length-joiner_corner_radius+overlap, wire_holder_height])
        difference() {
            cube([base_thickness+overlap*2, joiner_corner_radius, joiner_corner_radius]);
            rotate([0, 90, 0])
                cylinder(h=base_thickness+overlap*2, r=joiner_corner_radius);
        }
}

translate([base_width-base_thickness, 0, 0])
    cube([base_thickness, base_length, base_thickness+wire_holder_height]);


// Rod
// translate([rod_holder_thickness-rod_depth, base_width+rod_diameter, 0])
//     rotate([0, 90, 0])
//     cylinder(h=rod_length, r=rod_diameter/2);
